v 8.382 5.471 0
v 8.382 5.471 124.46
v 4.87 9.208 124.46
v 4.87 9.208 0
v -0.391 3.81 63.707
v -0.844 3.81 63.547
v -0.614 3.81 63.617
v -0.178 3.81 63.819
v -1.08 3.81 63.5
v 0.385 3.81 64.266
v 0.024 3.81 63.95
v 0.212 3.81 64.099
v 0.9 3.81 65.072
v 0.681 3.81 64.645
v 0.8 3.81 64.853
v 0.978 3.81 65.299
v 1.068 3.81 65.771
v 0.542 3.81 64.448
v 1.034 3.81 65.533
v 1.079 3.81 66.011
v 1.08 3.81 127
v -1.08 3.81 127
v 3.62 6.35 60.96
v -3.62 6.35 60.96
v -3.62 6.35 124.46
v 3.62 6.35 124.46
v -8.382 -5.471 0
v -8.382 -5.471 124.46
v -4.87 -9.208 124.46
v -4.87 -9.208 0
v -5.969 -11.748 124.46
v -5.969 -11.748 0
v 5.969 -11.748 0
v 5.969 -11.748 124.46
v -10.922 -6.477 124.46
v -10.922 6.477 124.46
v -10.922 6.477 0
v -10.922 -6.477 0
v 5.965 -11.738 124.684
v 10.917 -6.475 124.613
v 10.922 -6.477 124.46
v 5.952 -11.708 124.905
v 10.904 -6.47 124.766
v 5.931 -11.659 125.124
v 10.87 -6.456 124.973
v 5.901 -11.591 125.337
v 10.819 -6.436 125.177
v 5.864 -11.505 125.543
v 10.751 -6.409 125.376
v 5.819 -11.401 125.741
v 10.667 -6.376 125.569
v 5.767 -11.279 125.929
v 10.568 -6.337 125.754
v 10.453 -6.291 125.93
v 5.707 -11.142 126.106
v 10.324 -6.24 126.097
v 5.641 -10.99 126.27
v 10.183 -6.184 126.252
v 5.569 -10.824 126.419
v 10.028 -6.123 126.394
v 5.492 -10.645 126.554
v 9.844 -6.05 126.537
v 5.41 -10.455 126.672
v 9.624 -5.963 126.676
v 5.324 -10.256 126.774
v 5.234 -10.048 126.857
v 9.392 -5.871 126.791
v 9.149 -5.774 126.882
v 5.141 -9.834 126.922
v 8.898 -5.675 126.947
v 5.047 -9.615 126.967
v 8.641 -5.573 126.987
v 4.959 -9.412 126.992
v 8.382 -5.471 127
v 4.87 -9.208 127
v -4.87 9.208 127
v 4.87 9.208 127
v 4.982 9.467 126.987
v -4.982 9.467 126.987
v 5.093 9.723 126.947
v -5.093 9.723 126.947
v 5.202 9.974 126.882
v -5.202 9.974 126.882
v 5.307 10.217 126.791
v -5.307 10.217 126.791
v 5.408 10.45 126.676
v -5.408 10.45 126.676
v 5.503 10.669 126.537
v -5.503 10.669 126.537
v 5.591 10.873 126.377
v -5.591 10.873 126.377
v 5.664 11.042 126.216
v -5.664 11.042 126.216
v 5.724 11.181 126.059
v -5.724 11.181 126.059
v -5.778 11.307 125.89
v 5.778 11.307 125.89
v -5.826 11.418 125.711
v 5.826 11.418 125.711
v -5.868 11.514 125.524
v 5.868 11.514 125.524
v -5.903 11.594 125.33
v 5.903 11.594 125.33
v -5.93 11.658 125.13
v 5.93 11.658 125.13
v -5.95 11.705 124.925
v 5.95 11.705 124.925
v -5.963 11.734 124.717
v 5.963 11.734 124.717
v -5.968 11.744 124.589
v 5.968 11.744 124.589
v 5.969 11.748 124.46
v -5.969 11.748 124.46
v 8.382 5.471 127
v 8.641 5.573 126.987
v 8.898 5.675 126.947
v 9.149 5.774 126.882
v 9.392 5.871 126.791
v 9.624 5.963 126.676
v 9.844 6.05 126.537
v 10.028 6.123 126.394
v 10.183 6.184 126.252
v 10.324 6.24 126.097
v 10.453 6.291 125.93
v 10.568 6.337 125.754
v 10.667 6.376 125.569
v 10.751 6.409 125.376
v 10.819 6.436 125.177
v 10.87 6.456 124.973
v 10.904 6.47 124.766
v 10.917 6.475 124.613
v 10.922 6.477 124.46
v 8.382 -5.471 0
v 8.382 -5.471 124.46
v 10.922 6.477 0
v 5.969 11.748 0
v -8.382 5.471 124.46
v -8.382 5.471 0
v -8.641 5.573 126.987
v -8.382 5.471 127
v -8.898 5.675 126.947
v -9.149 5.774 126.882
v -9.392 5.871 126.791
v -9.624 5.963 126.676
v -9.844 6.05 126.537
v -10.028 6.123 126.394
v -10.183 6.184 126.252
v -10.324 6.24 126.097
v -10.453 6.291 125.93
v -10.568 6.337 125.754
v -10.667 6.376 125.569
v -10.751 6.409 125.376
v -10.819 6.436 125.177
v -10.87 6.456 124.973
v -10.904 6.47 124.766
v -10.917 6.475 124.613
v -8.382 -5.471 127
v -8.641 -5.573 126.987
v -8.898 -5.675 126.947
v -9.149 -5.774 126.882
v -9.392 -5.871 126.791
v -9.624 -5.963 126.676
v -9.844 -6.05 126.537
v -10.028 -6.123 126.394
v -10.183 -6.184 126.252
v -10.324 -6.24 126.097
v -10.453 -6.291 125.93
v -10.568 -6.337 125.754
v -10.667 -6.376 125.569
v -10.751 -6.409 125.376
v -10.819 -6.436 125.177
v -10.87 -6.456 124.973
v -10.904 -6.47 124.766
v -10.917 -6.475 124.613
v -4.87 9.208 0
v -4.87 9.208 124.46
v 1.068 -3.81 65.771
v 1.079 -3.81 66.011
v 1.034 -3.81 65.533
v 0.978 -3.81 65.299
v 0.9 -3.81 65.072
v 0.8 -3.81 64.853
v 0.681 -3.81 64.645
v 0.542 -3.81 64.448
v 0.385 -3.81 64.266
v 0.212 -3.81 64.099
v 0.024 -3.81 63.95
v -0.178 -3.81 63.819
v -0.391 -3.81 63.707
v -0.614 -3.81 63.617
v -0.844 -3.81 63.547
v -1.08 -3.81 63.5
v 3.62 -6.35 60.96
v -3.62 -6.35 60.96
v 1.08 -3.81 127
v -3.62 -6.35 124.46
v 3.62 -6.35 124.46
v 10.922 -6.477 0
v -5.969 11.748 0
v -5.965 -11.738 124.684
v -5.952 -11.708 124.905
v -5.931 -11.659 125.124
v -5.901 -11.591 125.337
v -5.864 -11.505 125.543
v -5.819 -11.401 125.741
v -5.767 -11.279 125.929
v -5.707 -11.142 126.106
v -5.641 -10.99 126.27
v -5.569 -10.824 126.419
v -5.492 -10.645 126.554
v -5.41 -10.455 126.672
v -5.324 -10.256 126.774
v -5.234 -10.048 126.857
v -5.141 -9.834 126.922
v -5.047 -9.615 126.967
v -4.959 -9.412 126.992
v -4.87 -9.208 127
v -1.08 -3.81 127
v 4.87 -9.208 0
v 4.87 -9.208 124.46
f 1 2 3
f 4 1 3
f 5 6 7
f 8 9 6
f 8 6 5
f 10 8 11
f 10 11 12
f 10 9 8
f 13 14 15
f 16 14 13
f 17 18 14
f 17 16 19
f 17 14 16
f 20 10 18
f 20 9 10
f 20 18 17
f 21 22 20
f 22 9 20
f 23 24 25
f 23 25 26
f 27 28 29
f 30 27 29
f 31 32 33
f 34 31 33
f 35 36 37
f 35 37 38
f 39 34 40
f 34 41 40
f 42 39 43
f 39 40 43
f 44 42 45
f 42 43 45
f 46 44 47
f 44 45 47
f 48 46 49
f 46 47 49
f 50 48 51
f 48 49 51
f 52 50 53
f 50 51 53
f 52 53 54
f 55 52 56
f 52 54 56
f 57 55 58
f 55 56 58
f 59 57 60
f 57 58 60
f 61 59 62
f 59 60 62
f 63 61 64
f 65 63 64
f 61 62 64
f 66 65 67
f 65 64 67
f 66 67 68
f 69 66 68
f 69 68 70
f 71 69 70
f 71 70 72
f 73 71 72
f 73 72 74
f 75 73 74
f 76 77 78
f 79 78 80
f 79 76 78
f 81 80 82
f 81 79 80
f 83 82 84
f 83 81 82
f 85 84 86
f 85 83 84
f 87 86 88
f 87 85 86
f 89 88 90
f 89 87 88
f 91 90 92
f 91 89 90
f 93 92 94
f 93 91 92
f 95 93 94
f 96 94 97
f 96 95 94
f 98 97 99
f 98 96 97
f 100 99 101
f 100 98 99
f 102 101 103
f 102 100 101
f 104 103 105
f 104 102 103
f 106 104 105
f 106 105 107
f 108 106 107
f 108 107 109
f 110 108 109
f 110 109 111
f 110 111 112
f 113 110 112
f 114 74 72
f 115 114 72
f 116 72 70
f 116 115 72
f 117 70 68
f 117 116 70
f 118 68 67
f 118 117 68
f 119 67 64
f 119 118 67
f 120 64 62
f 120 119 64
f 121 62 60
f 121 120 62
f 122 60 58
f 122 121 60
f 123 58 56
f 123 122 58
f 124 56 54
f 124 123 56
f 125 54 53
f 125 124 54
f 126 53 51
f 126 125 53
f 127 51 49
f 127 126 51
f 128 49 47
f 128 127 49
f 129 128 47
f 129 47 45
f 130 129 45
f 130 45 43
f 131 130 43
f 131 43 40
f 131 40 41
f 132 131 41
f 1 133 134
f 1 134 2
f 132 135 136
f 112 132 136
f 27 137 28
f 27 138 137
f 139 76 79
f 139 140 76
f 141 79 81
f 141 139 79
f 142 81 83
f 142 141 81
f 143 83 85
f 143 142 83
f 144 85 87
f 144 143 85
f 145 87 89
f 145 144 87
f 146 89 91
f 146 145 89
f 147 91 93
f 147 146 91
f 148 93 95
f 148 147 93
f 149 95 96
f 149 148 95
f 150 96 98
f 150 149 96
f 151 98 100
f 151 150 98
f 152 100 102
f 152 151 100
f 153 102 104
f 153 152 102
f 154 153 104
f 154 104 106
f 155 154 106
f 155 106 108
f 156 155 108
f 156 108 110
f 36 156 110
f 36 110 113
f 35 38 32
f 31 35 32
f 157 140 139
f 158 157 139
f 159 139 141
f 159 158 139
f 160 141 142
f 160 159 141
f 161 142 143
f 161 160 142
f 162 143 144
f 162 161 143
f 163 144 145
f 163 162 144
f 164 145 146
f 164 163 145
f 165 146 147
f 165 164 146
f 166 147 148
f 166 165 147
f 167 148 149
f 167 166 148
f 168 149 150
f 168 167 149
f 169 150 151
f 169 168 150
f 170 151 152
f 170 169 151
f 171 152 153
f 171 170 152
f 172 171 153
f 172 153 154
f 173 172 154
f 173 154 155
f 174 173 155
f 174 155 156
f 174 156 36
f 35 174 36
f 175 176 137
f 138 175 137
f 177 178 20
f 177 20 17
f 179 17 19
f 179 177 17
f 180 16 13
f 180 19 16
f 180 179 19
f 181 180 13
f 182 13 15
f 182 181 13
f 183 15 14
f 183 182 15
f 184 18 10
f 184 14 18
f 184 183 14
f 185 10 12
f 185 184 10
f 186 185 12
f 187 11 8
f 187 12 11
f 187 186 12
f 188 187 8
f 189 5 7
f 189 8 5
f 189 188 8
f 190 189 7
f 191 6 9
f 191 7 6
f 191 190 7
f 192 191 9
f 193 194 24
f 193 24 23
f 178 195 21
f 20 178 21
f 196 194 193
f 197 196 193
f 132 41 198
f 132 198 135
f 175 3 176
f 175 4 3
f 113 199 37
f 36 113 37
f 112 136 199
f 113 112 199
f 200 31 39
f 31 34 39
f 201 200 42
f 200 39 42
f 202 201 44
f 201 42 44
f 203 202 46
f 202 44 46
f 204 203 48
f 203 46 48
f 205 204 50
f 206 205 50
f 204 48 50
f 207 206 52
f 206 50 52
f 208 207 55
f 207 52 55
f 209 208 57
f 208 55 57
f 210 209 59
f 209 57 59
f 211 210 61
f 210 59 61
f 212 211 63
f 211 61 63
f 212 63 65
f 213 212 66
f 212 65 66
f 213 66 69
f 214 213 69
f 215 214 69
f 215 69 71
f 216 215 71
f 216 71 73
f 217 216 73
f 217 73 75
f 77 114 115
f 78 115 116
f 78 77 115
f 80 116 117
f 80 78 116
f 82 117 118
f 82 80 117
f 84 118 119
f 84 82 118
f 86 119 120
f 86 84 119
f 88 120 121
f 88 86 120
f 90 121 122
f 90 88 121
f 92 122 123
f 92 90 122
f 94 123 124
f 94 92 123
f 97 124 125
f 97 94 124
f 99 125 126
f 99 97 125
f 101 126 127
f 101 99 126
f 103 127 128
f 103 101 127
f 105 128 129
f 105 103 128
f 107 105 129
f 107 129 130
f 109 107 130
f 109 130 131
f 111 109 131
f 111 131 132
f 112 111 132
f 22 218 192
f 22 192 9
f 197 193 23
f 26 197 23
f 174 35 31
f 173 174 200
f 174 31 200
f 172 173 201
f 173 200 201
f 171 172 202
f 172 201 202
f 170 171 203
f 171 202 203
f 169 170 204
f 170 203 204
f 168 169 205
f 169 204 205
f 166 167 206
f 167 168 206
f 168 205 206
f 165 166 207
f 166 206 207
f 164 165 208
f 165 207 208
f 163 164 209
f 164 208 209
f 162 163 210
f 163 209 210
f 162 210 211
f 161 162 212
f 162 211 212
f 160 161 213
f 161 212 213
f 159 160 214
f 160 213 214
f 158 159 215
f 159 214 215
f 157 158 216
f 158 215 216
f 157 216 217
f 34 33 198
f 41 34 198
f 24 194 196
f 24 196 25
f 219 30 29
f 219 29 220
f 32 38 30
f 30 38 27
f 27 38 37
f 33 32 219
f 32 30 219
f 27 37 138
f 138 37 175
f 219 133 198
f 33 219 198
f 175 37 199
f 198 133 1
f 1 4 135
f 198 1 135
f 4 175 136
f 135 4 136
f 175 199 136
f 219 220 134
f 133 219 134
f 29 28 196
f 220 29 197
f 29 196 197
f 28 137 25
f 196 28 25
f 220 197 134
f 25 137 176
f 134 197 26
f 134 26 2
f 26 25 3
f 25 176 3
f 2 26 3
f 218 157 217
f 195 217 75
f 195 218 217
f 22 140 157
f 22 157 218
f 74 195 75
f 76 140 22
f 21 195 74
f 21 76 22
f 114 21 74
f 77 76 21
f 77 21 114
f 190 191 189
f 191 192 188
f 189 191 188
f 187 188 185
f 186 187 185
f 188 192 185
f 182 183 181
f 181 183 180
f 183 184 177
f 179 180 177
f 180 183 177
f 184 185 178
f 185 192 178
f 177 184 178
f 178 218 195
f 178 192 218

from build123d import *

# Parameters (mm, degrees)
F1_DEPTH    = 127
F2_W        = 2.159
F2_H        = 7.62
F3_DEPTH    = 63.5
F4_T        = -2.54
F5_R        = 2.54
F6_T4_DEPTH = 20.1763121576


# Not quite as in the source:
# - a fillet or chamfer that OpenCascade refuses, or shapes differently, is made with other operations: its cross-section is extruded or revolved along the edge and cut away or added


with BuildPart() as f1:
    # F0 (on Top) → F1 (new body)
    with BuildSketch(Plane.XY):
        Polygon((-5.969, -11.7475), (5.969, -11.7475), (10.922, -6.477), (10.922, 6.477), (5.969, 11.7475), (-5.969, 11.7475), (-10.922, 6.477), (-10.922, -6.477), align=None)
    extrude(amount=F1_DEPTH)

    # F2 (on face) → F3 (cut)
    with BuildSketch(Plane.XY.offset(127)):
        Rectangle(F2_W, F2_H)
    extrude(amount=-F3_DEPTH, mode=Mode.SUBTRACT)

    # F4
    f4_openings = [f1.faces().sort_by_distance(p)[0] for p in [
        (0, 0, 0),
    ]]
    offset(amount=F4_T, openings=f4_openings, kind=Kind.INTERSECTION)

    # F5
    f5_edges = [f1.edges().sort_by_distance(p)[0] for p in [
        (10.922, 0, 127),
        (0, 11.7475, 127),
        (-10.922, 0, 127),
        (0, -11.7475, 127),
        (-8.4455, 9.11225, 127),
        (8.4455, 9.11225, 127),
        (8.4455, -9.11225, 127),
        (-8.4455, -9.11225, 127),
    ]]
    fillet(f5_edges, radius=F5_R)

    # F6: fillet of radius 2.54 on 1 edges, made by hand


with BuildPart() as f6_tool2:
    # F6_s3 → F6_t4 (new body)
    with BuildSketch(Plane.XZ.offset(10.0881560788)):
        with BuildLine():
            ThreePointArc((1.0795, 66.0112624315), (0.4655503628, 64.3553850206), (-1.0795, 63.5))
            Line((-1.0795, 63.5), (1.0795, 63.5))
            Line((1.0795, 63.5), (1.0795, 66.0112624315))
        make_face()
    extrude(amount=-F6_T4_DEPTH)

    split(bisect_by=Plane.XZ.offset(6.35), keep=Keep.BOTTOM)

    split(bisect_by=Plane.XZ.offset(-6.35), keep=Keep.TOP)


with BuildPart() as f1_1:
    add(f1.part)

    # F6_t1: union F6_tool2
    add(f6_tool2.part)


solid = f1_1.part
